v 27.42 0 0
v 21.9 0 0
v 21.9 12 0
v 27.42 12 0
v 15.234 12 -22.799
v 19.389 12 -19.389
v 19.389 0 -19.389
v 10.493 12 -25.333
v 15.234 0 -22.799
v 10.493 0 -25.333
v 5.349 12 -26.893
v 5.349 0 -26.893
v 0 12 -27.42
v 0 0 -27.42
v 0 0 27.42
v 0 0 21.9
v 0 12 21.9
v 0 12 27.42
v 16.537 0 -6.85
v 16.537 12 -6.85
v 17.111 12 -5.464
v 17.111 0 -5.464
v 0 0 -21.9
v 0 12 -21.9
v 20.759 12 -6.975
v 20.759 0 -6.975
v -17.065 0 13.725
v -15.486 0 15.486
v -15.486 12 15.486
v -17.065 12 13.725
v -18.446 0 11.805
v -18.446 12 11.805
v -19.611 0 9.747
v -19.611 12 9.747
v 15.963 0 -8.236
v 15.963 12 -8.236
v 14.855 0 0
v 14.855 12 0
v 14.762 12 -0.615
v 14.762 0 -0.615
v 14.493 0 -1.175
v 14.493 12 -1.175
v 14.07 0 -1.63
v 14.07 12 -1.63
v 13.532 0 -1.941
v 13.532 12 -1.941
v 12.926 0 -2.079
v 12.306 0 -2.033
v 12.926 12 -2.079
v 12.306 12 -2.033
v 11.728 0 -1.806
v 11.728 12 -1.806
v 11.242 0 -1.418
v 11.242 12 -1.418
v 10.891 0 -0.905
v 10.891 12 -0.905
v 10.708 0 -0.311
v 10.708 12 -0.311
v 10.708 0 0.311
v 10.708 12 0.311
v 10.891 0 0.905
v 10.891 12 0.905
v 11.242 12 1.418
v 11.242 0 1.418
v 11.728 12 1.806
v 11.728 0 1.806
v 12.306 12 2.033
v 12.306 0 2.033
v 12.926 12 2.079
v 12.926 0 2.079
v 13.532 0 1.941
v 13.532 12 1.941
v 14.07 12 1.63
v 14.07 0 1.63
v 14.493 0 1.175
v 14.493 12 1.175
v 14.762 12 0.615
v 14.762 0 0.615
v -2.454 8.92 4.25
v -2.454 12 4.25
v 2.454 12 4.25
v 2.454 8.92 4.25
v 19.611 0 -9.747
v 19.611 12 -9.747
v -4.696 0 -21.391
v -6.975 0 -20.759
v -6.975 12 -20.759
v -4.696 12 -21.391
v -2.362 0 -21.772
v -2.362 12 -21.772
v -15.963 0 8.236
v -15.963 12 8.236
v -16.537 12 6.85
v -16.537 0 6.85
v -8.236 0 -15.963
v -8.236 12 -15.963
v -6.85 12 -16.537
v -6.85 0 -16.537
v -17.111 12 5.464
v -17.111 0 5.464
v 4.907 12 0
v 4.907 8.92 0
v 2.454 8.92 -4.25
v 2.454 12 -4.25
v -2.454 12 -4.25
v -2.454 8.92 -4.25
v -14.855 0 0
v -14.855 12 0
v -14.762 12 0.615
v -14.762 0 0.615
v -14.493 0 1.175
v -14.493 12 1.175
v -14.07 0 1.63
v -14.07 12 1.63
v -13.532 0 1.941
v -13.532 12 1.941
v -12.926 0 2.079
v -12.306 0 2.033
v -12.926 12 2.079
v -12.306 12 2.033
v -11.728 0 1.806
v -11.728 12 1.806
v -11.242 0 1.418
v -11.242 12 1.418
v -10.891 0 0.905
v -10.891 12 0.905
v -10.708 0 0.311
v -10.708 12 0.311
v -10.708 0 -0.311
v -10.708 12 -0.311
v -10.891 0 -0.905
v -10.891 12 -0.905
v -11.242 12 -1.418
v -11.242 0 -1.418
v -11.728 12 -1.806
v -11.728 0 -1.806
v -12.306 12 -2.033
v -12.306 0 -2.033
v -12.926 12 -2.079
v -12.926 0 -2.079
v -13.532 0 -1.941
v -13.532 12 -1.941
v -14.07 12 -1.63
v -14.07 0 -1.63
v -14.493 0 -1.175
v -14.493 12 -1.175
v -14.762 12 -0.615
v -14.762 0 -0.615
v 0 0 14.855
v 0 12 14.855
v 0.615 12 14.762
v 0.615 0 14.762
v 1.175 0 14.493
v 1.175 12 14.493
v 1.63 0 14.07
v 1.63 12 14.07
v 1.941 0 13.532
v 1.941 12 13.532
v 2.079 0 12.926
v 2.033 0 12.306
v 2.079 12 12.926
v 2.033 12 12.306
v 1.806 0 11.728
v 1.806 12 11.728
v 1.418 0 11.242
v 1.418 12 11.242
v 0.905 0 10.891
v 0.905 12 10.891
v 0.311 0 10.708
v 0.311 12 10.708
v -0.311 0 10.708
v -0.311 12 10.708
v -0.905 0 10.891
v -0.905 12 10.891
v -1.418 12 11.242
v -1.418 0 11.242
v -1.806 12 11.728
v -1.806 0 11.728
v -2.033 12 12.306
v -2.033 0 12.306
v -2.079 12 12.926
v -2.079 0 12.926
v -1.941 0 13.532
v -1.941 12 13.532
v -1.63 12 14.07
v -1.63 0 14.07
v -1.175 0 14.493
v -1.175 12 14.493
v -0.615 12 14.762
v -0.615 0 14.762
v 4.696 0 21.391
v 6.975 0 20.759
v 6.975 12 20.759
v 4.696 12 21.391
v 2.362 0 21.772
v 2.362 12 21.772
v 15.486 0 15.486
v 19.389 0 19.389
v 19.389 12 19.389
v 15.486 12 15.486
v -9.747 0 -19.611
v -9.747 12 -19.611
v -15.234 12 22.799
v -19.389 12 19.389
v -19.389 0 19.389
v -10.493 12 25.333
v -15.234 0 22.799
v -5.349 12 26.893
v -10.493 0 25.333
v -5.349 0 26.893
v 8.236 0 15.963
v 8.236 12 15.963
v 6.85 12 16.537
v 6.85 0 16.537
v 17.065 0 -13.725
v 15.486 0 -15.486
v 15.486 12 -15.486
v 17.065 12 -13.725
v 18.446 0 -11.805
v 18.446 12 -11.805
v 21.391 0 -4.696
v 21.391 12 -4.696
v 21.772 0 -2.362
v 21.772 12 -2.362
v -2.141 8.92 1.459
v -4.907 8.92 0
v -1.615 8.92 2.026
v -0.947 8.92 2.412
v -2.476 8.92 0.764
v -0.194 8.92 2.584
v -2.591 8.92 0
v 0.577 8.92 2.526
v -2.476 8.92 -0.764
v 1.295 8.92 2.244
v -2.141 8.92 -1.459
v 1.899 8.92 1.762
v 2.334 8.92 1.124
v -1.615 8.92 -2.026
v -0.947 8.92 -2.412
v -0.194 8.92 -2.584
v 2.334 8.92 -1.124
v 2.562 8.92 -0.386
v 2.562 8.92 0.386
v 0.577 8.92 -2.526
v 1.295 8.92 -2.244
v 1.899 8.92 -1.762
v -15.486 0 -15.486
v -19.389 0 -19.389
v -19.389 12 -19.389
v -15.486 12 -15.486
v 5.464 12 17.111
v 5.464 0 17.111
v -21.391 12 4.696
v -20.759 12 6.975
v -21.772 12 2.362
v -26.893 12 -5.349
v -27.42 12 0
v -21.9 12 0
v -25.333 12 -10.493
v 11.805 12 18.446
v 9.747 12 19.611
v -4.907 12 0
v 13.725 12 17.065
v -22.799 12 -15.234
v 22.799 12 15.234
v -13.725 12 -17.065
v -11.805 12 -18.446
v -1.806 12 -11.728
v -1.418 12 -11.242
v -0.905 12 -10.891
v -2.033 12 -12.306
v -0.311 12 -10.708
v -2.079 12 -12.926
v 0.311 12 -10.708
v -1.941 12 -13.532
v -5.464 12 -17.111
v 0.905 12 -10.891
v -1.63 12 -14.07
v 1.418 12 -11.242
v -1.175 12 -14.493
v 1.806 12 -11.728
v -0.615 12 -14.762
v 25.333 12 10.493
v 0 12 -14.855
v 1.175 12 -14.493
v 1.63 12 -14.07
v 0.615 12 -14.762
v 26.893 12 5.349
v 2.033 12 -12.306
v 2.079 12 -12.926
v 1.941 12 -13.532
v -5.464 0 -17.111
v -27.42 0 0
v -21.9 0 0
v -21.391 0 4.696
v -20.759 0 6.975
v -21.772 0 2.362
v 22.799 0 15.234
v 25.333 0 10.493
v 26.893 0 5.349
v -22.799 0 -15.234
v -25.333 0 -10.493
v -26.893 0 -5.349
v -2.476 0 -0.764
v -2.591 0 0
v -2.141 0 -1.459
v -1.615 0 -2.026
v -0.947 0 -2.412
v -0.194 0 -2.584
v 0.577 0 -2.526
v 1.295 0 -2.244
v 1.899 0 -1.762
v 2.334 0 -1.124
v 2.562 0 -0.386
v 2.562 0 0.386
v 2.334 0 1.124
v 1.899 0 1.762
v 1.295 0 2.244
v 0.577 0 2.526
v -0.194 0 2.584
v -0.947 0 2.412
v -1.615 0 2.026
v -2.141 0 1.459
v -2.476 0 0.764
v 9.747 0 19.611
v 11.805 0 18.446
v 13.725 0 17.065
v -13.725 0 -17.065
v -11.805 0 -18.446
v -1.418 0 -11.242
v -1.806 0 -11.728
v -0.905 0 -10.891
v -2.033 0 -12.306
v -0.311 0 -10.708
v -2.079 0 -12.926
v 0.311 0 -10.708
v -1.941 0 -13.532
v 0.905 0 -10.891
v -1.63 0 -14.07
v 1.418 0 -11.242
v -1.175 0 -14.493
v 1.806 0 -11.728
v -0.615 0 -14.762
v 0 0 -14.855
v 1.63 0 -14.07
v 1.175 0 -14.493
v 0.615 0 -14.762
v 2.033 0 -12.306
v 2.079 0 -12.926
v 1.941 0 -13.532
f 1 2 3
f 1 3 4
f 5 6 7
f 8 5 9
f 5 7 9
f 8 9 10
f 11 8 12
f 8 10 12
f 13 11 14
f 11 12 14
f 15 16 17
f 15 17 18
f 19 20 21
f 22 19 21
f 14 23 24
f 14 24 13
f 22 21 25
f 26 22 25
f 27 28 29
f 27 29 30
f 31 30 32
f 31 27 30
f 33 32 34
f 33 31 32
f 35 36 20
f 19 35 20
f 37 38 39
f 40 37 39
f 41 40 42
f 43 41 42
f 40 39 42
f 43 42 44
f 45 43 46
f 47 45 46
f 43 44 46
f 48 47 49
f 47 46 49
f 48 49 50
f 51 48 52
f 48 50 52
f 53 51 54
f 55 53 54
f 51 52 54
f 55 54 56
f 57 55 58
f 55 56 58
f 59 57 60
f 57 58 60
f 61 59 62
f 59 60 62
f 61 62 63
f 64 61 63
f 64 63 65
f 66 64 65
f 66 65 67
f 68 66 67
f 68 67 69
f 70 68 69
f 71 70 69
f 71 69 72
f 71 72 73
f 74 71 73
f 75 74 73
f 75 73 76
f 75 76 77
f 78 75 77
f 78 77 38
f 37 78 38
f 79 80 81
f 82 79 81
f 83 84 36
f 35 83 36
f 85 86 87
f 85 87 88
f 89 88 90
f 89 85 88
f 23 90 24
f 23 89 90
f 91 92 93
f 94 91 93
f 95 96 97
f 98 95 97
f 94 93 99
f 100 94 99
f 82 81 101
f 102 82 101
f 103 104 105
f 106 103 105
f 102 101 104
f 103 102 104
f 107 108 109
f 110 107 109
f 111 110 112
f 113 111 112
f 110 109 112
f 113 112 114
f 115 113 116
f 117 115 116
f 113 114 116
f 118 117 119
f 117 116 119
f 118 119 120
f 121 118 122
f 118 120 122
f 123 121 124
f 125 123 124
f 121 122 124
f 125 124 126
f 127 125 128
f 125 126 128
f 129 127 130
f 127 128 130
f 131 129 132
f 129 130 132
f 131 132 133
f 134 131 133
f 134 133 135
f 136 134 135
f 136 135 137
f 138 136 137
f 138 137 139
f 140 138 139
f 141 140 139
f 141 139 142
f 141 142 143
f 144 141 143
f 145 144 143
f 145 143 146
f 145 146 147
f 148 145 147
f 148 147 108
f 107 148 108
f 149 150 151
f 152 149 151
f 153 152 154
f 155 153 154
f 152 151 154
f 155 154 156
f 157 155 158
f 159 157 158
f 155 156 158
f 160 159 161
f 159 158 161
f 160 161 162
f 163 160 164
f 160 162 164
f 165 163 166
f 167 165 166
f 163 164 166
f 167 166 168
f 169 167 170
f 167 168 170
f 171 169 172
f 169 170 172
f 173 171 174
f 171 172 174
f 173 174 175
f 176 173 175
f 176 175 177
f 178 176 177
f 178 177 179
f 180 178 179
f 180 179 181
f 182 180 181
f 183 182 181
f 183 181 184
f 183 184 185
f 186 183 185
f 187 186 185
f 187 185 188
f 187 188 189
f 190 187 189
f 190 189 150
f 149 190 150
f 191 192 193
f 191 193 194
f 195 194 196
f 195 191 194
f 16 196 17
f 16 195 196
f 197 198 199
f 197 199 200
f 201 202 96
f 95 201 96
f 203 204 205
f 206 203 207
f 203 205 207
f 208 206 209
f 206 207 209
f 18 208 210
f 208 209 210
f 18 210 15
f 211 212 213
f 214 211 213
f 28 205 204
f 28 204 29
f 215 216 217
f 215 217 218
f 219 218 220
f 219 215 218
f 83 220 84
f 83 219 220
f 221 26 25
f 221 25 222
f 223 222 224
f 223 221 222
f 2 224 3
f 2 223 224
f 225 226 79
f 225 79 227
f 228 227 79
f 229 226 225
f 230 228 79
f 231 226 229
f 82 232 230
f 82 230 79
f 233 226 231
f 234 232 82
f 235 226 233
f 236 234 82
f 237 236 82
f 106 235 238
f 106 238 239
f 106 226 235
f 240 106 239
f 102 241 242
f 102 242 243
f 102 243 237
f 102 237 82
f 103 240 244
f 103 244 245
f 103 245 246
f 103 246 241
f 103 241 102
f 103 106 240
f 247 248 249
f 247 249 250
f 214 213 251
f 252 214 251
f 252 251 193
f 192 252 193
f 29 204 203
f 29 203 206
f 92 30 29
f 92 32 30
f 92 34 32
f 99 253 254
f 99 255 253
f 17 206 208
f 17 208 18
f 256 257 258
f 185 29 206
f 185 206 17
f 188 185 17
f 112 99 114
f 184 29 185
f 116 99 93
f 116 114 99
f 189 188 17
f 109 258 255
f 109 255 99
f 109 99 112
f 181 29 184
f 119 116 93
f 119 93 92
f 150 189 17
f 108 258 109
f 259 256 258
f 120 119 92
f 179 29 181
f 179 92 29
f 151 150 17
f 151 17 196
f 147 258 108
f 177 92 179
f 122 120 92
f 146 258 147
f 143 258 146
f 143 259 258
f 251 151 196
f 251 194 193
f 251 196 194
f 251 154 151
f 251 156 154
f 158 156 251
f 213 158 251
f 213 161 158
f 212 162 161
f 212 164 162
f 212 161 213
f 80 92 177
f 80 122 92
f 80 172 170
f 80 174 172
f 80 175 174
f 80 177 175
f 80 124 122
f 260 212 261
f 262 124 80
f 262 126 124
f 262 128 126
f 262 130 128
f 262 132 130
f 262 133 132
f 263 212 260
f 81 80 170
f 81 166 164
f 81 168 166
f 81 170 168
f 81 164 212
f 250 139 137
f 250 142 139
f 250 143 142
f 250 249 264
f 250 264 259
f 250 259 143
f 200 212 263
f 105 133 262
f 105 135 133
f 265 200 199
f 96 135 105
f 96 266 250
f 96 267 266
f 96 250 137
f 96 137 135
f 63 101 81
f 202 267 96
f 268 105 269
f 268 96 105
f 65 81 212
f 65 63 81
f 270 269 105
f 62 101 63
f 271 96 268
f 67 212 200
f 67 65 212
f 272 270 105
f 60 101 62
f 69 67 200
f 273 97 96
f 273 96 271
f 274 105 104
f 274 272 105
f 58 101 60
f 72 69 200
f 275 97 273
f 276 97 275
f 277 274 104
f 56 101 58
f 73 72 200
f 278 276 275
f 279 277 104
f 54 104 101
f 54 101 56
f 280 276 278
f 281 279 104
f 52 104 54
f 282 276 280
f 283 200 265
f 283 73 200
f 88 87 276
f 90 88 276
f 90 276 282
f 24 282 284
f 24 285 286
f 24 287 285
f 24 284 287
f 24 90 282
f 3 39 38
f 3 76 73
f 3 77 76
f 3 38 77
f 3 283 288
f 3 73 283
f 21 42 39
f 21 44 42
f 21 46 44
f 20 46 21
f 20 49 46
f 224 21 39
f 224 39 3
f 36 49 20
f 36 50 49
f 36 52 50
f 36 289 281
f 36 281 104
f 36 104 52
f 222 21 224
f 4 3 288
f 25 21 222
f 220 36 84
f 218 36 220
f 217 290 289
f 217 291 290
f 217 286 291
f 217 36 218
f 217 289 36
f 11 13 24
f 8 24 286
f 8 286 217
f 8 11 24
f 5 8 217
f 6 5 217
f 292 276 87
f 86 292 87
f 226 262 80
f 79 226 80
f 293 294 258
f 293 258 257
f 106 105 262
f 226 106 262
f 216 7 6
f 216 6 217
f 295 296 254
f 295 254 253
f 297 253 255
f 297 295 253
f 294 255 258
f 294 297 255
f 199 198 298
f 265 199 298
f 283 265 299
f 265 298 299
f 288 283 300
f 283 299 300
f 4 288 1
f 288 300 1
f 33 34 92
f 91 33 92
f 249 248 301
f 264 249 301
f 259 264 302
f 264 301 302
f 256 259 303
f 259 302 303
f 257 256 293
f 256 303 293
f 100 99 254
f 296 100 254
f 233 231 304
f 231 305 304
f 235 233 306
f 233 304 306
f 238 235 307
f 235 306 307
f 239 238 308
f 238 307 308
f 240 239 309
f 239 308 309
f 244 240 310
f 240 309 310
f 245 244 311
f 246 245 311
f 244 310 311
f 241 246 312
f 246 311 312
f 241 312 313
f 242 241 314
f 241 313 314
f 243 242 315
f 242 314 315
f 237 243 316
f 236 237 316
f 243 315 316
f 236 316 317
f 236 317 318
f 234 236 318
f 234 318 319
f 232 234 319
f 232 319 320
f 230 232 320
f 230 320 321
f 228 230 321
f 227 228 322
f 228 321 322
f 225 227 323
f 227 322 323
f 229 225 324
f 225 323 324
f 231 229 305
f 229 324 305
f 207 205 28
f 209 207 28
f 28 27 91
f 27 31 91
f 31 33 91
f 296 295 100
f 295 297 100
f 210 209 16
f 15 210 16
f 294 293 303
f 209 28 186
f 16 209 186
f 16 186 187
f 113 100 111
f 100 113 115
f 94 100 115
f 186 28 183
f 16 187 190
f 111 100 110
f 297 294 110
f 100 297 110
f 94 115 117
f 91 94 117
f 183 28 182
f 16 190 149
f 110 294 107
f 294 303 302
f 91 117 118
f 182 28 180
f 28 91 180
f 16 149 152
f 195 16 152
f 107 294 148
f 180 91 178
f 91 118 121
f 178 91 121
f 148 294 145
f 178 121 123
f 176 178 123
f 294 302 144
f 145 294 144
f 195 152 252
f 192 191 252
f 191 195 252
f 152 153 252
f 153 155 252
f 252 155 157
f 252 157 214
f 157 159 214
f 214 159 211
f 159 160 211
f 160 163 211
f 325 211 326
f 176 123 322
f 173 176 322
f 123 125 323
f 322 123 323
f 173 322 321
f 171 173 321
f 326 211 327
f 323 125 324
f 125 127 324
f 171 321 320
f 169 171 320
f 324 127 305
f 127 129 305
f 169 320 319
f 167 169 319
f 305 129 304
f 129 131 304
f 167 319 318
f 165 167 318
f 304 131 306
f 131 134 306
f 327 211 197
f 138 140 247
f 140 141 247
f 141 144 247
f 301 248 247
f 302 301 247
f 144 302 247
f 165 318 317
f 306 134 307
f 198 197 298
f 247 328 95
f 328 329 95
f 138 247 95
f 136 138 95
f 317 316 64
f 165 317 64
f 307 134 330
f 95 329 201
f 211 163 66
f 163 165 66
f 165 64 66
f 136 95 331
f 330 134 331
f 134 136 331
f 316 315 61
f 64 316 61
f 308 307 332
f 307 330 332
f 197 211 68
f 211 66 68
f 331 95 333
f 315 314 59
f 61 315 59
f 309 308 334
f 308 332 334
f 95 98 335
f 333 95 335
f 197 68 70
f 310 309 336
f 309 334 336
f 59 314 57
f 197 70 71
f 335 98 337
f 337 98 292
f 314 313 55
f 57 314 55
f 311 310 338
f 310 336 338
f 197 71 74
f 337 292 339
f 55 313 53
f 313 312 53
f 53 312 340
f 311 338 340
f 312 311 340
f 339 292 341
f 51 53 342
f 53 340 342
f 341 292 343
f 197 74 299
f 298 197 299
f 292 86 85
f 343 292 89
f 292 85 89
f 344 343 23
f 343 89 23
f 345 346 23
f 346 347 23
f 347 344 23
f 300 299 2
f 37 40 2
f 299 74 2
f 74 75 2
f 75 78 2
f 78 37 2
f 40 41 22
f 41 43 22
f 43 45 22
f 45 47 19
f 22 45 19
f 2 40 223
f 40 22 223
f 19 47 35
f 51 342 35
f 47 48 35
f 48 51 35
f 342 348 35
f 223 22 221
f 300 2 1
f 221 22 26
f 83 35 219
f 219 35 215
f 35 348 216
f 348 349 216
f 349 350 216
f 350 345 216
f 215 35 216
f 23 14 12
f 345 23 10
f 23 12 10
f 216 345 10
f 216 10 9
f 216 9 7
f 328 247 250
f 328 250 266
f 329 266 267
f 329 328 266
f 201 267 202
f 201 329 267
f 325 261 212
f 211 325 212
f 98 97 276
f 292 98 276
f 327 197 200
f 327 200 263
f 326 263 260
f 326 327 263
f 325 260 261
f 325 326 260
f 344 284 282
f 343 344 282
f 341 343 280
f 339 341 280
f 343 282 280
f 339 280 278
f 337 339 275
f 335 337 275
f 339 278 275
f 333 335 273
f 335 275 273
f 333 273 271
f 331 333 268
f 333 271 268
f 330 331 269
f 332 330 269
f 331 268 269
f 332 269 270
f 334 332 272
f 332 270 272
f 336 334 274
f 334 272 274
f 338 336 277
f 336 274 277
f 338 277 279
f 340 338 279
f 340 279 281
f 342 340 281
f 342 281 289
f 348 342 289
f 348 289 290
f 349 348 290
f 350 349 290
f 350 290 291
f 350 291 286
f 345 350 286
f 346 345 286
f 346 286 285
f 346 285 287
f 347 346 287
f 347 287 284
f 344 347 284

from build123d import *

# Parameters (mm, degrees)
SKETCH2_R                      = 27.42
BOSS_EXTRUDE1_DEPTH            = 12
CUT_EXTRUDE1_DEPTH             = 13
SKETCH3_R                      = 2.085
CUT_EXTRUDE2_DEPTH             = 13
CIRPATTERN1_COUNT              = 4
CUT_EXTRUDE4_DEPTH             = 13
CIRPATTERN2_COUNT              = 4
F_6_0_204_DIAMETER_HOLE1_D     = 5.1816
F_6_0_204_DIAMETER_HOLE1_DEPTH = 12
F_6_0_204_DIAMETER_HOLE1_TIP   = 1.556709692
CUT_EXTRUDE5_DEPTH             = 3.08


with BuildPart() as part:
    # Sketch2 → Boss-Extrude1 (new body)
    with BuildSketch(Plane(origin=(0, 0, 0), x_dir=(1, 0, 0), z_dir=(0, 1, 0))):
        Circle(SKETCH2_R)
    extrude(amount=BOSS_EXTRUDE1_DEPTH)

    # Sketch1 → Cut-Extrude1 (cut, through all)
    with BuildSketch(Plane(origin=(0, 0, 0), x_dir=(1, 0, 0), z_dir=(0, 1, 0))):
        with BuildLine():
            Line((0, 21.9), (0, 27.42))
            ThreePointArc((0, 27.42), (-10.493179715, 25.332776781), (-19.38886794, 19.38886794))
            Line((-19.38886794, 19.38886794), (-15.485638508, 15.485638508))
            ThreePointArc((-15.485638508, 15.485638508), (-8.380767169, 20.232961762), (0, 21.9))
        make_face()
        with BuildLine():
            Line((0, -21.9), (0, -27.42))
            ThreePointArc((0, -27.42), (10.493179715, -25.332776781), (19.38886794, -19.38886794))
            Line((19.38886794, -19.38886794), (15.485638508, -15.485638508))
            ThreePointArc((15.485638508, -15.485638508), (8.380767169, -20.232961762), (0, -21.9))
        make_face()
        with BuildLine():
            Line((21.9, 0), (27.42, 0))
            ThreePointArc((27.42, 0), (25.332776781, 10.493179715), (19.38886794, 19.38886794))
            Line((19.38886794, 19.38886794), (15.485638508, 15.485638508))
            ThreePointArc((15.485638508, 15.485638508), (20.232961762, 8.380767169), (21.9, 0))
        make_face()
        with BuildLine():
            Line((-21.9, 0), (-27.42, 0))
            ThreePointArc((-27.42, 0), (-25.332776781, -10.493179715), (-19.38886794, -19.38886794))
            Line((-19.38886794, -19.38886794), (-15.485638508, -15.485638508))
            ThreePointArc((-15.485638508, -15.485638508), (-20.232961762, -8.380767169), (-21.9, 0))
        make_face()
    extrude(amount=CUT_EXTRUDE1_DEPTH, mode=Mode.SUBTRACT)

    # Sketch3 → Cut-Extrude2 (cut, through all)
    with BuildSketch(Plane(origin=(0, 12, 0), x_dir=(1, 0, 0), z_dir=(0, 1, 0))):
        with Locations((12.77, 0)):
            Circle(SKETCH3_R)
    cut_extrude2 = extrude(amount=-CUT_EXTRUDE2_DEPTH, mode=Mode.SUBTRACT)

    # CirPattern1: Cut-Extrude2 ×4 about axis
    cirpattern1_axis = Axis((0, 0, 0), (0, 1, 0))
    for i in range(1, CIRPATTERN1_COUNT):
        add(cut_extrude2.rotate(cirpattern1_axis, i * 360 / CIRPATTERN1_COUNT), mode=Mode.SUBTRACT)

    # Sketch5 → Cut-Extrude4 (cut, through all)
    with BuildSketch(Plane(origin=(0, 12, 0), x_dir=(1, 0, 0), z_dir=(0, 1, 0))):
        Polygon((-5.464214141, 17.11146878), (-7.413599954, 21.81770245), (-10.185238552, 20.669652153), (-8.235852738, 15.963418483), (-6.850033439, 16.537443632), align=None)
    cut_extrude4 = extrude(amount=-CUT_EXTRUDE4_DEPTH, mode=Mode.SUBTRACT)

    # CirPattern2: Cut-Extrude4 ×4 about axis
    cirpattern2_axis = Axis((0, 0, 0), (0, 1, 0))
    for i in range(1, CIRPATTERN2_COUNT):
        add(cut_extrude4.rotate(cirpattern2_axis, i * 360 / CIRPATTERN2_COUNT), mode=Mode.SUBTRACT)

    # #6 (0.204) Diameter Hole1
    with Locations(Plane(origin=(0, 12, 0), x_dir=(1, 0, 0), z_dir=(0, 1, 0))):
        with Locations((0, 0)):
            Hole(F_6_0_204_DIAMETER_HOLE1_D / 2, depth=F_6_0_204_DIAMETER_HOLE1_DEPTH)
            with Locations((0, 0, -(F_6_0_204_DIAMETER_HOLE1_DEPTH + F_6_0_204_DIAMETER_HOLE1_TIP / 2))):  # 118° drill point
                Cone(0, F_6_0_204_DIAMETER_HOLE1_D / 2, F_6_0_204_DIAMETER_HOLE1_TIP, mode=Mode.SUBTRACT)

    # Sketch8 → Cut-Extrude5 (cut)
    with BuildSketch(Plane(origin=(0, 12, 0), x_dir=(1, 0, 0), z_dir=(0, 1, 0))):
        Polygon((2.453738644, -4.25), (4.907477288, 0), (2.453738644, 4.25), (-2.453738644, 4.25), (-4.907477288, 0), (-2.453738644, -4.25), align=None)
    extrude(amount=-CUT_EXTRUDE5_DEPTH, mode=Mode.SUBTRACT)


solid = part.part
